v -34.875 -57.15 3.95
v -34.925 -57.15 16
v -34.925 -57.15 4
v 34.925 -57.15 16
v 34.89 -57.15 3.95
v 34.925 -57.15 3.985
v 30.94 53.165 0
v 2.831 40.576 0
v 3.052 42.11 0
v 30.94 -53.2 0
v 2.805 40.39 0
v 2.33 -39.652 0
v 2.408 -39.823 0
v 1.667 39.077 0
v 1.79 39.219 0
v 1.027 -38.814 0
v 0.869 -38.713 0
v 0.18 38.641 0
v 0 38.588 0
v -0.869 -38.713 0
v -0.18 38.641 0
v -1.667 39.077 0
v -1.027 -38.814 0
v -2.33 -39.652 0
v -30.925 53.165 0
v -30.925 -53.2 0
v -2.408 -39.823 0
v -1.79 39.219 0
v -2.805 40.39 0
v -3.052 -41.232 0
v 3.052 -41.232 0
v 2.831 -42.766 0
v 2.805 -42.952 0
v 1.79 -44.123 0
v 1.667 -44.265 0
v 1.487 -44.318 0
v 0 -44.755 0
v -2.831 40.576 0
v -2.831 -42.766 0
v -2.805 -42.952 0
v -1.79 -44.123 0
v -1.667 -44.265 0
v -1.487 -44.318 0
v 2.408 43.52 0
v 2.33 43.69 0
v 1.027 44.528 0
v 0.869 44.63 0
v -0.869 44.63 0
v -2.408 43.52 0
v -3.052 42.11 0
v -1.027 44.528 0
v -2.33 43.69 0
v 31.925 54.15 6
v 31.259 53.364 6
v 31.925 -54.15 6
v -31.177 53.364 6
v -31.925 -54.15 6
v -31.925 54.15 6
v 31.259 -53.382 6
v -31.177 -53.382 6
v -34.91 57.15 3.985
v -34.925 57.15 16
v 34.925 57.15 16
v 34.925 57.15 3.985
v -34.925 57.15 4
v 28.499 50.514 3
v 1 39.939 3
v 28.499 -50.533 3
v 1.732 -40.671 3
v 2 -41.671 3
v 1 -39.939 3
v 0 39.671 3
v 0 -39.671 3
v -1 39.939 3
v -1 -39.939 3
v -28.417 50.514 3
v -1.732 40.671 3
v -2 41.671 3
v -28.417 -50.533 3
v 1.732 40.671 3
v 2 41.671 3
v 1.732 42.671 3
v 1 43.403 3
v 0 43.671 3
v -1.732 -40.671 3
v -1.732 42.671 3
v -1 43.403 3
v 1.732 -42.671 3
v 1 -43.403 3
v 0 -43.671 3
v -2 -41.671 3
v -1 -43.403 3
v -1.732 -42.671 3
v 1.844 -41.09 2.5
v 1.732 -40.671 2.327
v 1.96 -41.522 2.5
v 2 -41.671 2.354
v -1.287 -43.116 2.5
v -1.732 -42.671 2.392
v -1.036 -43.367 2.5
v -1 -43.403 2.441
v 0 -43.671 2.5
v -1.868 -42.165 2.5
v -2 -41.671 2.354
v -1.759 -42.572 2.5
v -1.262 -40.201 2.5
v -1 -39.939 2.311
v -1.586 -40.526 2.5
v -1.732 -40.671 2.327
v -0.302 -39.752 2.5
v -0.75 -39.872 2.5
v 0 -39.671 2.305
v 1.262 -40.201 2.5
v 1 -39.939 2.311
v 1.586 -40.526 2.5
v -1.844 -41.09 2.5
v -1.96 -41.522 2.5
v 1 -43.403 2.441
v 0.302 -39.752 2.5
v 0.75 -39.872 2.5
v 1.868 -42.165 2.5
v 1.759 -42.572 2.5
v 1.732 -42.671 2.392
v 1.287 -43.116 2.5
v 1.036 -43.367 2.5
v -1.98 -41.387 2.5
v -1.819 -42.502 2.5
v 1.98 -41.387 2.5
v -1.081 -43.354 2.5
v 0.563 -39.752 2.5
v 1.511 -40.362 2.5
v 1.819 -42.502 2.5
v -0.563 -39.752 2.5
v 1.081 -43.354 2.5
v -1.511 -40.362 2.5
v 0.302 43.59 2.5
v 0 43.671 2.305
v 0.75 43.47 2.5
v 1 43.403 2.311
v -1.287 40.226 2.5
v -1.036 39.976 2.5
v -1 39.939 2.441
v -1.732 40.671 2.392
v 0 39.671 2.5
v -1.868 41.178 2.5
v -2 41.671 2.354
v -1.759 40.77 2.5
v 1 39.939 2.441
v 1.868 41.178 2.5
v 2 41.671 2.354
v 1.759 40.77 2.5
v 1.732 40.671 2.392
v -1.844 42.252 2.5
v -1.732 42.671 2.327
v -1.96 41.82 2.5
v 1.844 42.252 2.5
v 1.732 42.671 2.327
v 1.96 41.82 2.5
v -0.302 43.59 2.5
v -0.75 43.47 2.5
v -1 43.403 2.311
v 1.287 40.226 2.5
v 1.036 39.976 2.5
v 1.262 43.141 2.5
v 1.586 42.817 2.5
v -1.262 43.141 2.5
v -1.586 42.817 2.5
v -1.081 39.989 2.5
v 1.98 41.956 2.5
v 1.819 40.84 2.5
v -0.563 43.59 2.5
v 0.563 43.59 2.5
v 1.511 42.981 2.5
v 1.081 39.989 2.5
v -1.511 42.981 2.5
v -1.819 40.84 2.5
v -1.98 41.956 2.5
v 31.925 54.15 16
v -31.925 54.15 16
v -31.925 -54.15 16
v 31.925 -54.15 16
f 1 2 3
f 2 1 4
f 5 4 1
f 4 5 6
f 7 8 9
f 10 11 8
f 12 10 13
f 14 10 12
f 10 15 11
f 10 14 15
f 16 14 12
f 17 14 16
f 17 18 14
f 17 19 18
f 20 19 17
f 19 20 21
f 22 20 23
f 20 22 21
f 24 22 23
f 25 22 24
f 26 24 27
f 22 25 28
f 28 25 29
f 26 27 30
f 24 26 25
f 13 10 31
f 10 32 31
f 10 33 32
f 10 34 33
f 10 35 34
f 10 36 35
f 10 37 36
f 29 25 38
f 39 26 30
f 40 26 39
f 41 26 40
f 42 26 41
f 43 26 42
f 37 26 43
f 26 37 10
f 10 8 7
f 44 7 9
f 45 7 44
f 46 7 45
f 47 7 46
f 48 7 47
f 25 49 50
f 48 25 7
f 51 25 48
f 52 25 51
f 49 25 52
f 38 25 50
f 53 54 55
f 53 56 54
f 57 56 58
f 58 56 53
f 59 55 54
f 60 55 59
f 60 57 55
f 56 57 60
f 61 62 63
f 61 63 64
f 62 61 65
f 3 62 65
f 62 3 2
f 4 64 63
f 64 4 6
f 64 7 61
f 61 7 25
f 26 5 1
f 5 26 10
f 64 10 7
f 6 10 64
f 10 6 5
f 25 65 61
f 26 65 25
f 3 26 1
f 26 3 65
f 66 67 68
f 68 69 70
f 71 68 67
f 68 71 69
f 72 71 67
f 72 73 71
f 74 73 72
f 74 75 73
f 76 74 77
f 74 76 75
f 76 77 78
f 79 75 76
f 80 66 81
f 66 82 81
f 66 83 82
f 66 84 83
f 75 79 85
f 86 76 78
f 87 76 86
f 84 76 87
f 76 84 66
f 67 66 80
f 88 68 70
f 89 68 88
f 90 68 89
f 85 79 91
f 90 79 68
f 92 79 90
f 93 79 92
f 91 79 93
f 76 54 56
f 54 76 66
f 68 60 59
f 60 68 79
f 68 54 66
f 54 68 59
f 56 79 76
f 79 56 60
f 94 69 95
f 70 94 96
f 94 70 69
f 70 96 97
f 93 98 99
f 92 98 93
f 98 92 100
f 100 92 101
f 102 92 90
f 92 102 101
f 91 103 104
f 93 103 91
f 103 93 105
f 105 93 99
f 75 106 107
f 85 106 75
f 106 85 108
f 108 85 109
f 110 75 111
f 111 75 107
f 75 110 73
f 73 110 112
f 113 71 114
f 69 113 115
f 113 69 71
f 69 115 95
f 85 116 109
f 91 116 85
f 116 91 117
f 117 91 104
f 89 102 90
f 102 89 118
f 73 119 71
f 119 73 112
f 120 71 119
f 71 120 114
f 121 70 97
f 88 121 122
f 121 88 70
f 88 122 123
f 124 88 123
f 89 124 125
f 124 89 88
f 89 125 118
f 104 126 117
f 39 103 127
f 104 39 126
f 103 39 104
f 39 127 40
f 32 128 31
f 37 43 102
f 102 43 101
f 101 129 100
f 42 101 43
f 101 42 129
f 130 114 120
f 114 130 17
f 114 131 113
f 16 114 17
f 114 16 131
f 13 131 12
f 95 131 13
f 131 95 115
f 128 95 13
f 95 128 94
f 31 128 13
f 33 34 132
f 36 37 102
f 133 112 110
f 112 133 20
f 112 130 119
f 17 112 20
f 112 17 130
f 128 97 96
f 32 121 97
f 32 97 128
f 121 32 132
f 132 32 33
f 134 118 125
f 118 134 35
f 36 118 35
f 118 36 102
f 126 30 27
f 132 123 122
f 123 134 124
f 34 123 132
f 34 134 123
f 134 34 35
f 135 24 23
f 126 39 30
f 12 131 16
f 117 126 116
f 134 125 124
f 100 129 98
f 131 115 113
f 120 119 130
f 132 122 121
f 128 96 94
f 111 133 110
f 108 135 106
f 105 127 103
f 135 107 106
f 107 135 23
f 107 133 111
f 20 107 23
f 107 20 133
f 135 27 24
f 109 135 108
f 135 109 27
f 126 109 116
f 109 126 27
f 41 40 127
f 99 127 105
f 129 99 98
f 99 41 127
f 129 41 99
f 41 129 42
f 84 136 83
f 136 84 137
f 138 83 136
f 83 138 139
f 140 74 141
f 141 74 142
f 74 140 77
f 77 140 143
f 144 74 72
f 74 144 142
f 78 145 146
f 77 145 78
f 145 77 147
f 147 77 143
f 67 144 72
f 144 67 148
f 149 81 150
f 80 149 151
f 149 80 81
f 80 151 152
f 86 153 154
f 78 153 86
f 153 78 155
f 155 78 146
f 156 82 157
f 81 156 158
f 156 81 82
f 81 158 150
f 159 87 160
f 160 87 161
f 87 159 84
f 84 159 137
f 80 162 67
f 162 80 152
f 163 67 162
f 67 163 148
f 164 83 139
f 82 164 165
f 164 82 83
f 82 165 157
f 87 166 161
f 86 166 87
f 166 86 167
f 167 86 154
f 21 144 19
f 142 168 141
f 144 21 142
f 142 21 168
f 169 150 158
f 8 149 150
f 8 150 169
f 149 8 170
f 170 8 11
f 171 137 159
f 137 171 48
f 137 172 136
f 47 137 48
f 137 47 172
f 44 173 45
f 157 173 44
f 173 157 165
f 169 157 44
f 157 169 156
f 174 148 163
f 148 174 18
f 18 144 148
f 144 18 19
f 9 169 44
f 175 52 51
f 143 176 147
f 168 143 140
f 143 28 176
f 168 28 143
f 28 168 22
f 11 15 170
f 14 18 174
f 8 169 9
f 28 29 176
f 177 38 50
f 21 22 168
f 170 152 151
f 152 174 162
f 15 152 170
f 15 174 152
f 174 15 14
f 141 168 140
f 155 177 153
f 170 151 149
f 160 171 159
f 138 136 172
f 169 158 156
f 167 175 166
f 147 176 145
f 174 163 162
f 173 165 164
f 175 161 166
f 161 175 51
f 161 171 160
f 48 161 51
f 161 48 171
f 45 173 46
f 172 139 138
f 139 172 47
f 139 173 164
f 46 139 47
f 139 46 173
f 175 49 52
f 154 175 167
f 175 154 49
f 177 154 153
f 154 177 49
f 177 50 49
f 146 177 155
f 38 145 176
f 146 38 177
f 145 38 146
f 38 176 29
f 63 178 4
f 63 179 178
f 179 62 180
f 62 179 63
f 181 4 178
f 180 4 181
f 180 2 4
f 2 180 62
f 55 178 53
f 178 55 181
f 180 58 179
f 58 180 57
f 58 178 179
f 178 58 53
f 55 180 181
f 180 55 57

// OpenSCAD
// WALLY - Wall Plate Customizer v1.3
// by TheNewHobbyist 2013 (http://thenewhobbyist.com)
// http://www.thingiverse.com/thing:47956
//
// Most of the connectors used with this thing are panel mount connectors from
// www.DataPro.net I can't vouch for their quality but they did have easy to
// find dimensions for their products so I used them.
//
// This could be tightened up considerably but I thought I'd get it out there for people
// to experiment with before I lose my mind staring at it too long. Also this is my
// first OpenSCAD model so cut me some slack ;)
//
//   Notes:
//
// * The plug types "Duplex Outlet", "Long_Toggle Switch", "Toggle Switch", and "Rocker"
//   will all use the entire plate when selected in top or bottom configuration. The
//   other selection (if not "none" will be selected.
//
// * "None" and "Blank should not be considered equal. if "None" is selected for one of
//   the two holes on a plate the other selection will be centered on that plate. If
//   "Blank" is selected that plug location will remain blank but the other selection
//   will NOT move into a centered position.
//
//	Change Log:
//
//	v1.1
//	UPDATED: Screw hole locations for designer and toggle plate types.
//	UPDATED: Hole size for designer plate type.
//	UPDATED: Outlet hole spacing
//
//	v1.2
//	ADDED: Long Toggle Switch for laird
//
//	v1.3
//	ADDED: 3 new sizes for plate export: Standard, Junior-Jumbo, and Jumbo.
//

  //////////////////////////
 // Customizer Settings: //
//////////////////////////

//How big are we talkin' here?
plate_width = 1; //	[1:5]

// Bigger hole in your wall? Try this
plate_size = 0; // [0:Standard, 1:Junior-Jumbo, 2:Jumbo]

//Pick a plug or full plate type
1st_plate = "none";  //	["none":None, "blank":Blank Port, "toggle":Full Plate - Toggle Switch, "long_toggle":Full Plate - Long Toggle Switch, "outlet":Full Plate - Duplex Outlet, "rocker":Full Plate - Rocker/Designer Plate, "keystone1":Keystone Jack, "vga":VGA Port, "hdmi":HDMI Port, "dvi":DVI-I Port, "displayport":Displayport, "cat5e":Cat5e/Cat6 Port, "usb-a":USB-A Port, "usb-b":USB-B Port, "firewire":Firewire IEEE 1394 Port, "db09":DB-09 Port, "ps2":PS2 Port, "f-type": F-Type/Coaxial Port,"svideo":S-Video Port, "stereo":Stereo Headphone Jack]
//Pick a bottom plug type or leave as none
1st_plate_bottom_hole = "none";  //	["none":None, "blank":Blank Port, "keystone1":Keystone Jack, "vga":VGA Port, "hdmi":HDMI Port, "dvi":DVI-I Port, "displayport":Displayport, "cat5e":Cat5e/Cat6 Port, "usb-a":USB-A Port, "usb-b":USB-B Port, "firewire":Firewire IEEE 1394 Port, "db09":DB-09 Port, "ps2":PS2 Port, "f-type": F-Type/Coaxial Port,"svideo":S-Video Port, "stereo":Stereo Headphone Jack]
//Pick a plug or full plate type
2nd_plate = "none";  //	["none":None, "blank":Blank Port, "toggle":Full Plate - Toggle Switch, "long_toggle":Full Plate - Long Toggle Switch, "outlet":Full Plate - Duplex Outlet, "rocker":Full Plate - Rocker/Designer Plate, "keystone1":Keystone Jack, "vga":VGA Port, "hdmi":HDMI Port, "dvi":DVI-I Port, "displayport":Displayport, "cat5e":Cat5e/Cat6 Port, "usb-a":USB-A Port, "usb-b":USB-B Port, "firewire":Firewire IEEE 1394 Port, "db09":DB-09 Port, "ps2":PS2 Port, "f-type": F-Type/Coaxial Port,"svideo":S-Video Port, "stereo":Stereo Headphone Jack]
//Pick a bottom plug type or leave as none
2nd_plate_bottom_hole = "none";  //	["none":None, "blank":Blank Port, "keystone1":Keystone Jack, "vga":VGA Port, "hdmi":HDMI Port, "dvi":DVI-I Port, "displayport":Displayport, "cat5e":Cat5e/Cat6 Port, "usb-a":USB-A Port, "usb-b":USB-B Port, "firewire":Firewire IEEE 1394 Port, "db09":DB-09 Port, "ps2":PS2 Port, "f-type": F-Type/Coaxial Port,"svideo":S-Video Port, "stereo":Stereo Headphone Jack]
//Pick a plug or full plate type
3rd_plate = "none";  //	["none":None, "blank":Blank Port, "toggle":Full Plate - Toggle Switch, "long_toggle":Full Plate - Long Toggle Switch, "outlet":Full Plate - Duplex Outlet, "rocker":Full Plate - Rocker/Designer Plate, "keystone1":Keystone Jack, "vga":VGA Port, "hdmi":HDMI Port, "dvi":DVI-I Port, "displayport":Displayport, "cat5e":Cat5e/Cat6 Port, "usb-a":USB-A Port, "usb-b":USB-B Port, "firewire":Firewire IEEE 1394 Port, "db09":DB-09 Port, "ps2":PS2 Port, "f-type": F-Type/Coaxial Port,"svideo":S-Video Port, "stereo":Stereo Headphone Jack]
//Pick a bottom plug type or leave as none
3rd_plate_bottom_hole = "none";  //	["none":None, "blank":Blank Port, "keystone1":Keystone Jack, "vga":VGA Port, "hdmi":HDMI Port, "dvi":DVI-I Port, "displayport":Displayport, "cat5e":Cat5e/Cat6 Port, "usb-a":USB-A Port, "usb-b":USB-B Port, "firewire":Firewire IEEE 1394 Port, "db09":DB-09 Port, "ps2":PS2 Port, "f-type": F-Type/Coaxial Port,"svideo":S-Video Port, "stereo":Stereo Headphone Jack]
//Pick a plug or full plate type
4th_plate = "none";  //["none":None, "blank":Blank Port, "toggle":Full Plate - Toggle Switch, "long_toggle":Full Plate - Long Toggle Switch, "outlet":Full Plate - Duplex Outlet, "rocker":Full Plate - Rocker/Designer Plate, "keystone1":Keystone Jack, "vga":VGA Port, "hdmi":HDMI Port, "dvi":DVI-I Port, "displayport":Displayport, "cat5e":Cat5e/Cat6 Port, "usb-a":USB-A Port, "usb-b":USB-B Port, "firewire":Firewire IEEE 1394 Port, "db09":DB-09 Port, "ps2":PS2 Port, "f-type": F-Type/Coaxial Port,"svideo":S-Video Port, "stereo":Stereo Headphone Jack]
//Pick a bottom plug type or leave as none
4th_plate_bottom_hole = "none";  //	["none":None, "blank":Blank Port, "keystone1":Keystone Jack, "vga":VGA Port, "hdmi":HDMI Port, "dvi":DVI-I Port, "displayport":Displayport, "cat5e":Cat5e/Cat6 Port, "usb-a":USB-A Port, "usb-b":USB-B Port, "firewire":Firewire IEEE 1394 Port, "db09":DB-09 Port, "ps2":PS2 Port, "f-type": F-Type/Coaxial Port,"svideo":S-Video Port, "stereo":Stereo Headphone Jack]
//Pick a plug or full plate type
5th_plate = "none";  //["none":None, "blank":Blank Port, "toggle":Full Plate - Toggle Switch, "long_toggle":Full Plate - Long Toggle Switch, "outlet":Full Plate - Duplex Outlet, "rocker":Full Plate - Rocker/Designer Plate, "keystone1":Keystone Jack, "vga":VGA Port, "hdmi":HDMI Port, "dvi":DVI-I Port, "displayport":Displayport, "cat5e":Cat5e/Cat6 Port, "usb-a":USB-A Port, "usb-b":USB-B Port, "firewire":Firewire IEEE 1394 Port, "db09":DB-09 Port, "ps2":PS2 Port, "f-type": F-Type/Coaxial Port,"svideo":S-Video Port, "stereo":Stereo Headphone Jack]
//Pick a bottom plug type or leave as none
5th_plate_bottom_hole = "none";  //	["none":None, "blank":Blank Port, "keystone1":Keystone Jack, "vga":VGA Port, "hdmi":HDMI Port, "dvi":DVI-I Port, "displayport":Displayport, "cat5e":Cat5e/Cat6 Port, "usb-a":USB-A Port, "usb-b":USB-B Port, "firewire":Firewire IEEE 1394 Port, "db09":DB-09 Port, "ps2":PS2 Port, "f-type": F-Type/Coaxial Port,"svideo":S-Video Port, "stereo":Stereo Headphone Jack]

//Extra Amount that plate extends from wall (useful for shallow boxes)
plate_sticks_out = 10; // [0-40]
//Wall thickness for plate extension
sticks_out_thick = 3; // [2-4]

  //////////////////////
 // Static Settings: //
//////////////////////

module GoAwayCustomizer() {
// This module is here to stop Customizer from picking up the variables below
}

l_offset = [34.925,39.6875,44.45];
r_offset = [34.925,39.6875,44.45];
spacer = [0,0,46.0375,92.075,138.1125,184.15];
solid_plate_width = l_offset[plate_size] + spacer[plate_width] + r_offset[plate_size];

height_sizes = [114.3,123.825,133.35];

height = 114.3; //plate height (static)
gang_width=[0,69.86,115.824,161.925,206.375,254]; // Plate widths (standard)

edgewidth = solid_plate_width + 10; // Bevel setting for top and bottom
rightbevel = solid_plate_width - 4; // Bevel for right side (scales)

left_offset = 34.925; // Offset first hole position
switch_offset = 46.0375; // Offset all additional holes
thinner_offset=[0,0.92,0.95,0.96,0.97,0.973]; // Manual fix for right side wackiness

positions=[height_sizes[plate_size]/2,height_sizes[plate_size]/2 - 14.25,height_sizes[plate_size]/2 + 14.25];

// preview[view:north, tilt:bottom]


  ///////////////////
 // Hole Control: //
///////////////////

module plate1(){
	if (1st_plate == "toggle" || 1st_plate_bottom_hole == "toggle"){
		translate([0,l_offset[plate_size],0]) toggle_screws();
		translate([0,l_offset[plate_size],0]) hole("toggle");
		}
	else if (1st_plate == "long_toggle" || 1st_plate_bottom_hole == "long_toggle"){
		translate([0,l_offset[plate_size],0]) toggle_screws();
		translate([0,l_offset[plate_size],0]) hole("long_toggle");
		}
	else if (1st_plate == "rocker" || 1st_plate_bottom_hole == "rocker"){
		translate([0,l_offset[plate_size],0]) rocker_screws();
		translate([0,l_offset[plate_size],0]) hole("rocker");
		}
	else if (1st_plate == "outlet" || 1st_plate_bottom_hole == "outlet") {
	translate([0,l_offset[plate_size],0]) hole("outlet");
	}
	else if (1st_plate_bottom_hole == "none") {
		translate([0,l_offset[plate_size],0]) box_screws();
		translate([positions[0],l_offset[plate_size],0]) hole(1st_plate);
			}
	else if (1st_plate == "none") {
		translate([0,l_offset[plate_size],0]) box_screws();
		translate([positions[0],l_offset[plate_size],0]) hole(1st_plate_bottom_hole);
			}
	else {
	translate([0,l_offset[plate_size],0]) box_screws();
	translate([positions[1],l_offset[plate_size],0]) hole(1st_plate);
	translate([positions[2],l_offset[plate_size],0]) hole(1st_plate_bottom_hole);
	}
}

module plate2(){
	if (2nd_plate == "toggle" || 2nd_plate_bottom_hole == "toggle"){
		translate([0,l_offset[plate_size] + switch_offset,0]) toggle_screws();
		translate([0,l_offset[plate_size] + switch_offset,0]) hole("toggle");
		}
	else if (2nd_plate == "long_toggle" || 2nd_plate_bottom_hole == "long_toggle"){
		translate([0,l_offset[plate_size] + switch_offset,0]) toggle_screws();
		translate([0,l_offset[plate_size] + switch_offset,0]) hole("long_toggle");
		}
	else if (2nd_plate == "rocker" || 2nd_plate_bottom_hole == "rocker"){
		translate([0,l_offset[plate_size] + switch_offset,0]) rocker_screws();
		translate([0,l_offset[plate_size] + switch_offset,0]) hole("rocker");
		}
	else if (2nd_plate == "outlet" || 2nd_plate_bottom_hole == "outlet") {
	translate([0,l_offset[plate_size] + switch_offset,0]) hole("outlet");
	}
	else if (2nd_plate_bottom_hole == "none") {
		translate([0,l_offset[plate_size] + switch_offset,0]) box_screws();
		translate([positions[0],l_offset[plate_size] + switch_offset,0]) hole(2nd_plate);
			}
	else if (2nd_plate == "none") {
		translate([0,l_offset[plate_size] + switch_offset,0]) box_screws();
		translate([positions[0],l_offset[plate_size] + switch_offset,0]) hole(2nd_plate_bottom_hole);
			}
	else {
	translate([0,l_offset[plate_size] + switch_offset,0]) box_screws();
	translate([positions[1],l_offset[plate_size] + switch_offset,0]) hole(2nd_plate);
	translate([positions[2],l_offset[plate_size] + switch_offset,0]) hole(2nd_plate_bottom_hole);
	}
}

module plate3(){
	if (3rd_plate == "toggle" || 3rd_plate_bottom_hole == "toggle"){
		translate([0,l_offset[plate_size] + switch_offset * 2,0]) toggle_screws();
		translate([0,l_offset[plate_size] + switch_offset * 2,0]) hole("toggle");
		}
	else if (3rd_plate == "long_toggle" || 3rd_plate_bottom_hole == "long_toggle"){
		translate([0,l_offset[plate_size] + switch_offset * 2,0]) toggle_screws();
		translate([0,l_offset[plate_size] + switch_offset * 2,0]) hole("long_toggle");
		}
	else if (3rd_plate == "rocker" || 3rd_plate_bottom_hole == "rocker"){
		translate([0,l_offset[plate_size] + switch_offset * 2,0]) rocker_screws();
		translate([0,l_offset[plate_size] + switch_offset * 2,0]) hole("rocker");
		}
	else if (3rd_plate == "outlet" || 3rd_plate_bottom_hole == "outlet") {
	translate([0,l_offset[plate_size] + switch_offset * 2,0]) hole("outlet");
	}
	else if (3rd_plate_bottom_hole == "none") {
		translate([0,l_offset[plate_size] + switch_offset * 2,0]) box_screws();
		translate([positions[0],l_offset[plate_size] + switch_offset * 2,0]) hole(3rd_plate);
			}
	else if (3rd_plate == "none") {
		translate([0,l_offset[plate_size] + switch_offset * 2,0]) box_screws();
		translate([positions[0],l_offset[plate_size] + switch_offset * 2,0]) hole(3rd_plate_bottom_hole);
			}
	else {
	translate([0,l_offset[plate_size] + switch_offset * 2,0]) box_screws();
	translate([positions[1],l_offset[plate_size] + switch_offset * 2,0]) hole(3rd_plate);
	translate([positions[2],l_offset[plate_size] + switch_offset * 2,0]) hole(3rd_plate_bottom_hole);
	}
}

module plate4(){
	if (4th_plate == "toggle" || 4th_plate_bottom_hole == "toggle"){
		translate([0,l_offset[plate_size] + switch_offset * 3,0]) toggle_screws();
		translate([0,l_offset[plate_size] + switch_offset * 3,0]) hole("toggle");
		}
	else if (4th_plate == "long_toggle" || 4th_plate_bottom_hole == "long_toggle"){
		translate([0,l_offset[plate_size] + switch_offset * 3,0]) toggle_screws();
		translate([0,l_offset[plate_size] + switch_offset * 3,0]) hole("long_toggle");
		}
	else if (4th_plate == "rocker" || 4th_plate_bottom_hole == "rocker"){
		translate([0,l_offset[plate_size] + switch_offset * 3,0]) rocker_screws();
		translate([0,l_offset[plate_size] + switch_offset * 3,0]) hole("rocker");
		}
	else if (4th_plate == "outlet" || 4th_plate_bottom_hole == "outlet") {
	translate([0,l_offset[plate_size] + switch_offset * 3,0]) hole("outlet");
	}
	else if (4th_plate_bottom_hole == "none") {
		translate([0,l_offset[plate_size] + switch_offset * 3,0]) box_screws();
		translate([positions[0],l_offset[plate_size] + switch_offset * 3,0]) hole(4th_plate);
			}
	else if (4th_plate == "none") {
		translate([0,l_offset[plate_size] + switch_offset * 3,0]) box_screws();
		translate([positions[0],l_offset[plate_size] + switch_offset * 3,0]) hole(4th_plate_bottom_hole);
			}
	else {
	translate([0,l_offset[plate_size] + switch_offset * 3,0]) box_screws();
	translate([positions[1],l_offset[plate_size] + switch_offset * 3,0]) hole(4th_plate);
	translate([positions[2],l_offset[plate_size] + switch_offset * 3,0]) hole(4th_plate_bottom_hole);
	}
}

module plate5(){
	if (5th_plate == "toggle" || 5th_plate_bottom_hole == "toggle"){
		translate([0,l_offset[plate_size] + switch_offset * 4,0]) toggle_screws();
		translate([0,l_offset[plate_size] + switch_offset * 4,0]) hole("toggle");
		}
	else if (5th_plate == "long_toggle" || 5th_plate_bottom_hole == "long_toggle"){
		translate([0,l_offset[plate_size] + switch_offset * 4,0]) toggle_screws();
		translate([0,l_offset[plate_size] + switch_offset * 4,0]) hole("long_toggle");
		}
	else if (5th_plate == "rocker" || 5th_plate_bottom_hole == "rocker"){
		translate([0,l_offset[plate_size] + switch_offset * 4,0]) rocker_screws();
		translate([0,l_offset[plate_size] + switch_offset * 4,0]) hole("rocker");
		}
	else if (5th_plate == "outlet" || 5th_plate_bottom_hole == "outlet") {
	translate([0,l_offset[plate_size] + switch_offset * 4,0]) hole("outlet");
	}
	else if (5th_plate_bottom_hole == "none") {
		translate([0,l_offset[plate_size] + switch_offset * 4,0]) box_screws();
		translate([positions[0],l_offset[plate_size] + switch_offset * 4,0]) hole(5th_plate);
			}
	else if (5th_plate == "none") {
		translate([0,l_offset[plate_size] + switch_offset * 4,0]) box_screws();
		translate([positions[0],l_offset[plate_size] + switch_offset * 4,0]) hole(5th_plate_bottom_hole);
			}
	else {
	translate([0,l_offset[plate_size] + switch_offset * 4,0]) box_screws();
	translate([positions[1],l_offset[plate_size] + switch_offset * 4,0]) hole(5th_plate);
	translate([positions[2],l_offset[plate_size] + switch_offset * 4,0]) hole(5th_plate_bottom_hole);
	}
}

  /////////////////
 // SolidWorks: //
/////////////////

module extend_box() { union () {
	translate([0,0,-plate_sticks_out]) cube([height_sizes[plate_size],sticks_out_thick,plate_sticks_out]);
	translate([0,solid_plate_width-sticks_out_thick,-plate_sticks_out]) cube([height_sizes[plate_size],sticks_out_thick,plate_sticks_out]);
	translate([0,0,-plate_sticks_out]) cube([sticks_out_thick,solid_plate_width,plate_sticks_out]);
	translate([height_sizes[plate_size]-sticks_out_thick,0,-plate_sticks_out]) cube([sticks_out_thick,solid_plate_width,plate_sticks_out]);
    }
}
	    
	    module plate1_solid(){
if (1st_plate == "keystone1" && 1st_plate_bottom_hole == "none") {
	translate([height_sizes[plate_size]/2 + 14.3,l_offset[plate_size] - 11.5,-3.9]) hole("keystone_solid");
	}
else if (1st_plate == "keystone1" && 1st_plate_bottom_hole != "outlet" && 1st_plate_bottom_hole != "toggle" && 1st_plate_bottom_hole != "rocker") {
	translate([height_sizes[plate_size]/2,l_offset[plate_size] - 11.5,-3.9]) hole("keystone_solid");
	}
if (1st_plate_bottom_hole == "keystone1" && 1st_plate == "none") {
	translate([height_sizes[plate_size]/2 + 14.3,l_offset[plate_size] - 11.5,-3.9]) hole("keystone_solid");
	}
else if (1st_plate_bottom_hole == "keystone1" && 1st_plate != "outlet" && 1st_plate != "toggle" && 1st_plate != "rocker") {
	translate([height_sizes[plate_size]/2 + 28.5,l_offset[plate_size] - 11.5,-3.9]) hole("keystone_solid");
	}

}

module plate2_solid(){
if (2nd_plate == "keystone1" && 2nd_plate_bottom_hole == "none") {
	translate([height_sizes[plate_size]/2 + 14.3,l_offset[plate_size] - 11.5 + switch_offset,-3.9]) hole("keystone_solid");
	}
else if (2nd_plate == "keystone1" && 2nd_plate_bottom_hole != "outlet" && 2nd_plate_bottom_hole != "toggle" && 2nd_plate_bottom_hole != "rocker") {
	translate([height_sizes[plate_size]/2,l_offset[plate_size] - 11.5 + switch_offset,-3.9]) hole("keystone_solid");
	}
if (2nd_plate_bottom_hole == "keystone1" && 2nd_plate == "none") {
	translate([height_sizes[plate_size]/2 + 14.3,l_offset[plate_size] - 11.5 + switch_offset,-3.9]) hole("keystone_solid");
	}
else if (2nd_plate_bottom_hole == "keystone1" && 2nd_plate != "outlet" && 2nd_plate != "toggle" && 2nd_plate != "rocker") {
	translate([height_sizes[plate_size]/2 + 28.5,l_offset[plate_size] - 11.5 + switch_offset,-3.9]) hole("keystone_solid");
	}

}

module plate3_solid(){
if (3rd_plate == "keystone1" && 3rd_plate_bottom_hole == "none") {
	translate([height_sizes[plate_size]/2 + 14.3,l_offset[plate_size] - 11.5 + switch_offset * 2,-3.9]) hole("keystone_solid");
	}
else if (3rd_plate == "keystone1" && 3rd_plate_bottom_hole != "outlet" && 3rd_plate_bottom_hole != "toggle" && 3rd_plate_bottom_hole != "rocker") {
	translate([height_sizes[plate_size]/2,l_offset[plate_size] - 11.5 + switch_offset * 2,-3.9]) hole("keystone_solid");
	}
if (3rd_plate_bottom_hole == "keystone1" && 3rd_plate == "none") {
	translate([height_sizes[plate_size]/2 + 14.3,l_offset[plate_size] - 11.5 + switch_offset * 2,-3.9]) hole("keystone_solid");
	}
else if (3rd_plate_bottom_hole == "keystone1" && 3rd_plate != "outlet" && 3rd_plate != "toggle" && 3rd_plate != "rocker") {
	translate([height_sizes[plate_size]/2 + 28.5,l_offset[plate_size] - 11.5 + switch_offset * 2,-3.9]) hole("keystone_solid");
	}

}

module plate4_solid(){
if (4th_plate == "keystone1" && 4th_plate_bottom_hole == "none") {
	translate([height_sizes[plate_size]/2 + 14.3,l_offset[plate_size] - 11.5 + switch_offset * 3,-3.9]) hole("keystone_solid");
	}
else if (4th_plate == "keystone1" && 4th_plate_bottom_hole != "outlet" && 4th_plate_bottom_hole != "toggle" && 4th_plate_bottom_hole != "rocker") {
	translate([height_sizes[plate_size]/2,l_offset[plate_size] - 11.5 + switch_offset * 3,-3.9]) hole("keystone_solid");
	}
if (4th_plate_bottom_hole == "keystone1" && 4th_plate == "none") {
	translate([height_sizes[plate_size]/2 + 14.3,l_offset[plate_size] - 11.5 + switch_offset * 3,-3.9]) hole("keystone_solid");
	}
else if (4th_plate_bottom_hole == "keystone1" && 4th_plate != "outlet" && 4th_plate != "toggle" && 4th_plate != "rocker") {
	translate([height_sizes[plate_size]/2 + 28.5,l_offset[plate_size] - 11.5 + switch_offset * 3,-3.9]) hole("keystone_solid");
	}

}

module plate5_solid(){
if (5th_plate == "keystone1" && 5th_plate_bottom_hole == "none") {
	translate([height_sizes[plate_size]/2 + 14.3,l_offset[plate_size] - 11.5 + switch_offset * 4,-3.9]) hole("keystone_solid");
	}
else if (5th_plate == "keystone1" && 5th_plate_bottom_hole != "outlet" && 5th_plate_bottom_hole != "toggle" && 5th_plate_bottom_hole != "rocker") {
	translate([height_sizes[plate_size]/2,l_offset[plate_size] - 11.5 + switch_offset * 4,-3.9]) hole("keystone_solid");
	}
if (5th_plate_bottom_hole == "keystone1" && 5th_plate == "none") {
	translate([height_sizes[plate_size]/2 + 14.3,l_offset[plate_size] - 11.5 + switch_offset * 4,-3.9]) hole("keystone_solid");
	}
else if (5th_plate_bottom_hole == "keystone1" && 5th_plate != "outlet" && 5th_plate != "toggle" && 5th_plate != "rocker") {
	translate([height_sizes[plate_size]/2 + 28.5,l_offset[plate_size] - 11.5 + switch_offset * 4,-3.9]) hole("keystone_solid");
	}

}

  ///////////////////
 // PlateStation: //
///////////////////

//Plate size and bevel
module plate() {
    union () {
	difference() {
		cube([height_sizes[plate_size],solid_plate_width,6]);
		translate([-4.3,-5,6.2]) rotate([0,45,0]) cube([6,edgewidth,6]); //Top Bevel
		translate([height_sizes[plate_size]-4.2,-5,6.25]) rotate([0,45,0]) cube([6,edgewidth,6]); //Bottom Bevel
		translate([height_sizes[plate_size]+10,-4.4,6.1]) rotate([0,45,90]) cube([6,height_sizes[plate_size]+20,6]); //Left Bevel (doesn't change)
		translate([height_sizes[plate_size]+10,rightbevel,6]) rotate([0,45,90]) cube([6,height_sizes[plate_size]+10,6]); //Right Bevel (scales right)
	    }
	}
    }


// Thinning Plate
module plate_inner() {
	scale([0.95,thinner_offset[plate_width],1]){
	translate([3,3,0]){
	difference() {
		cube([height_sizes[plate_size],solid_plate_width,6]);
		translate([-4.3,-5,6.2]) rotate([0,45,0]) cube([6,edgewidth,6]); //Top Bevel
		translate([height_sizes[plate_size]-4.2,-5,6.25]) rotate([0,45,0]) cube([6,edgewidth,6]); //Bottom Bevel
		translate([height_sizes[plate_size]+10,-4.4,6.1]) rotate([0,45,90]) cube([6,height_sizes[plate_size]+20,6]); //Left Bevel (doesn't change)
		translate([height_sizes[plate_size]+10,rightbevel,6]) rotate([0,45,90]) cube([6,height_sizes[plate_size]+10,6]); //Right Bevel (scales right)
				}
			}
		}
	}

// Box screw holes
module box_screws(){
	 translate([height_sizes[plate_size]/2 + 41.67125,0,-1]) cylinder(r=2, h=10, $fn=12);
	 translate([height_sizes[plate_size]/2 + 41.67125,0,3.5]) cylinder(r1=2, r2=3.3, h=3);
	 translate([height_sizes[plate_size]/2 - 41.67125,0,-1]) cylinder(r=2, h=10, $fn=12);
	 translate([height_sizes[plate_size]/2 - 41.67125,0,3.5]) cylinder(r1=2, r2=3.3, h=3);
}

// Rocker/Designer screw holes
module rocker_screws(){
	 translate([height_sizes[plate_size]/2 + 48.41875,0,-1]) cylinder(r=2, h=10, $fn=12);
	 translate([height_sizes[plate_size]/2 + 48.41875,0,3.5]) cylinder(r1=2, r2=3.3, h=3);
	 translate([height_sizes[plate_size]/2 - 48.41875,0,-1]) cylinder(r=2, h=10, $fn=12);
	 translate([height_sizes[plate_size]/2 - 48.41875,0,3.5]) cylinder(r1=2, r2=3.3, h=3);
}

// Toggle screw holes
module toggle_screws(){
	 translate([height_sizes[plate_size]/2 + 30.1625,0,-1]) cylinder(r=2, h=10, $fn=12);
	 translate([height_sizes[plate_size]/2 + 30.1625,0,3.5]) cylinder(r1=2, r2=3.3, h=3);
	 translate([height_sizes[plate_size]/2 - 30.1625,0,-1]) cylinder(r=2, h=10, $fn=12);
	 translate([height_sizes[plate_size]/2 - 30.1625,0,3.5]) cylinder(r1=2, r2=3.3, h=3);
}

  ///////////////
 // Portland: //
///////////////

// Hole Cutout definitions
module hole(hole_type) {


// Toggle switch hole
	if (hole_type == "toggle") {
		translate([height_sizes[plate_size]/2,0,0]) cube([23.8125,10.3188,15], center = true);
		 						}

// Toggle switch hole and screw holes
	if (hole_type == "long_toggle") {
		translate([height_sizes[plate_size]/2,0,0]) cube([43.6563,11.9063,15], center = true);
		 						}

// Rocker switch plate
	if (hole_type == "rocker") {
		translate([height_sizes[plate_size]/2,0,0]) cube([67.1,33.3,15], center = true);

		 						}

// Duplex power outlet plate or dual side toggles
	if (hole_type == "outlet" || hole_type == "dualsidetoggle") {
		translate([height_sizes[plate_size]/2 + 19.3915,0,0]) {
			difference() {
				cylinder(r=17.4625, h=15, center = true);
				translate([-24.2875,-15,-2]) cube([10,37,15], center = false);
				translate([14.2875,-15,-2]) cube([10,37,15], center = false);
								}
							}
		translate([height_sizes[plate_size]/2 - 19.3915,0,0]){
			difference(){
				cylinder(r=17.4625, h=15, center = true);
				translate([-24.2875,-15,-2]) cube([10,37,15], center = false);
				translate([14.2875,-15,-2]) cube([10,37,15], center = false);
								}
							}
		translate([height_sizes[plate_size]/2,0,-1]) cylinder(r=2, h=10);
		translate([height_sizes[plate_size]/2,0,3.5]) cylinder(r1=2, r2=3.3, h=3);
							}

// Blank plate
	if (hole_type == "blank") { }

// VGA & DB09 plate
// VGA Fits http://www.datapro.net/products/vga-dual-panel-mount-f-f-cable.html
// DB09 Fits http://www.datapro.net/products/db9-serial-panel-mount-male-extension.html
	if (hole_type == "vga" || hole_type == "db09") {

			translate([0,-12.5,3]) cylinder(r=1.75, h=10, center = true);
			translate([0,12.5,3]) cylinder(r=1.75, h=10, center = true);
				difference(){
					cube([10,19,13], center=true);
					translate([-5,-9.2,1]) rotate([0,0,-35.6]) cube([4.4,2.4,15], center=true);
					translate([.9,-11.2,0]) rotate([0,0,9.6]) cube([10,4.8,15], center=true);
					translate([4.6,-8.5,0]) rotate([0,0,37.2]) cube([4.4,2.4,15], center=true);
					translate([-5,9.2,1]) rotate([0,0,35.6]) cube([4.4,2.4,15], center=true);
					translate([0.9,11.2,0]) rotate([0,0,-9.6]) cube([10,4.8,15], center=true);
					translate([4.6,8.5,0]) rotate([0,0,-37.2]) cube([4.4,2.4,15], center=true);
								}
						}

// HDMI plate
// Fits http://www.datapro.net/products/hdmi-panel-mount-extension-cable.html
	if (hole_type == "hdmi") {
		translate([0,-13,3]) cylinder(r=1.75, h=10, center = true);
		translate([0,13,3]) cylinder(r=1.75, h=10, center = true);
		translate([0,0,3]) cube([6,16,10], center=true);
							}

// DVI-I plate
// Fits http://www.datapro.net/products/dvi-i-panel-mount-extension-cable.html
	if (hole_type == "dvi") {
		translate([0,-16,3]) cylinder(r=1.75, h=10, center = true);
		translate([0,16,3]) cylinder(r=1.75, h=10, center = true);
		translate([0,0,3]) cube([10,26,10], center=true);
							}

// DisplayPort plate
// Fits http://www.datapro.net/products/dvi-i-panel-mount-extension-cable.html
	if (hole_type == "displayport") {
		translate([0,-13.5,3]) cylinder(r=1.75, h=10, center = true);
		translate([0,13.5,3]) cylinder(r=1.75, h=10, center = true);
		translate([0,0,0]){
			difference(){
				translate([0,0,3]) cube([7,19,10], center=true);
				translate([2.47,-9.37,3]) rotate([0,0,-54.6]) cube([3,5,14], center=true);
						}
								}
									}

// USB-A Plate
// Fits http://www.datapro.net/products/usb-panel-mount-type-a-cable.html
	if (hole_type == "usb-a") {
		translate([0,-15,3]) cylinder(r=1.75, h=10, center = true);
		translate([0,15,3]) cylinder(r=1.75, h=10, center = true);
		translate([0,0,3]) cube([8,16,10], center=true);
							}

// USB-B Plate
// Fits http://www.datapro.net/products/usb-panel-mount-type-b-cable.html
	if (hole_type == "usb-b") {
		translate([0,-13,3]) cylinder(r=1.75, h=10, center = true);
		translate([0,13,3]) cylinder(r=1.75, h=10, center = true);
		translate([0,0,3]) cube([11,12,10], center=true);
							}

// 1394 Firewire Plate
// Fits http://www.datapro.net/products/firewire-panel-mount-extension.html
	if (hole_type == "firewire") {
		translate([0,-13.5,3]) cylinder(r=1.75, h=10, center = true);
		translate([0,13.5,3]) cylinder(r=1.75, h=10, center = true);
		translate([0,0,3]) cube([7,12,10], center=true);
							}

// F-Type / Cable TV Plate
// Fits http://www.datapro.net/products/f-type-panel-mounting-coupler.html
	if (hole_type == "f-type") {
		translate([0,0,3]) cylinder(r=4.7625, h=10, center=true);
							}

// Cat5e & Gat6 plate
// Cat5e Fits http://www.datapro.net/products/cat-5e-panel-mount-ethernet.html
// Cat6 Fits hhttp://www.datapro.net/products/cat-6-panel-mount-ethernet.html
	if (hole_type == "cat5e" || hole_type == "cat6") {
		translate([0,-12.5,3]) cylinder(r=1.75, h=10, center = true);
		translate([0,12.5,3]) cylinder(r=1.75, h=10, center = true);
		translate([0,0,3]) cube([15,15,10], center=true);
		}

// S-Video & PS2 plate
// S-Video Fits hhttp://www.datapro.net/products/cat-6-panel-mount-ethernet.html
// PS2 http://www.datapro.net/products/ps2-panel-mount-extension-cable.html
	if (hole_type == "svideo" || hole_type == "ps2") {
		translate([0,-10,3]) cylinder(r=1.75, h=10, center = true);
		translate([0,10,3]) cylinder(r=1.75, h=10, center = true);
		translate([0,0,3]) cylinder(r=5, h=10, center=true);
		}


// Stereo / 1/4" headphone jack coupler
// Stereo coupler Fits http://www.datapro.net/products/stereo-panel-mount-coupler.html
	if (hole_type == "stereo") {
		translate([0,0,3]) cylinder(r=2.985, h=10, center=true);
		}

//Keystone1 hole
//Hole for 1 Keystone Jack
	if (hole_type == "keystone1") {
		translate([0,0,5]) cube([16.5,15,10], center = true);
	}

//Keystone Solid
	if (hole_type == "keystone_solid") {
		rotate([0,0,90]) {
			difference(){
				translate([0,0,.1]) cube([23,30.5,9.8]);
					translate([4,4,0]){
						difference(){
							cube([15,22.5,10]);
							translate([-1,-0.001,3.501]) cube([17,2,6.5]);
							translate([-1,2.5,-3.40970]) rotate([45,0,0]) cube([17,2,6.5]);
							translate([-1,18.501,6.001]) cube([17,4,4]);
							translate([-1,20.5,0]) rotate([-45,0,0]) cube([17,2,6.5]);
						}
					}
				}
			}
		}

//End of module "hole"
}

  ////////////////////////
 // Number One ENGAGE: //
////////////////////////

// Rotate so it sits correctly on plate (whoops) and make upside down
rotate([0,180,90]){
// put plate at 0,0,0 for easier printing
translate([-height_sizes[plate_size]/2,-solid_plate_width/2,-6]){

    union() {
    
if (plate_width == 1) {
	difference() {
		plate();
		translate([0,0,-3]) plate_inner();
		plate1();
			}
		union() {
		plate1_solid();
		}
	    }
else if (plate_width == 2) {
difference()
{
plate();
translate([0,0,-3]) plate_inner();
plate1();
plate2();
}
union() {
		plate1_solid();
		plate2_solid();
		}
}
else if (plate_width == 3) {
difference()
{
plate();
translate([0,0,-3]) plate_inner();
plate1();
plate2();
plate3();
}
union() {
		plate1_solid();
		plate2_solid();
		plate3_solid();
		}
}

else if (plate_width == 4) {
difference()
{
plate();
translate([0,0,-3]) plate_inner();
plate1();
plate2();
plate3();
plate4();
}
union() {
		plate1_solid();
		plate2_solid();
		plate3_solid();
		plate4_solid();
		}
}

else if (plate_width == 5) {
difference()
{
plate();
translate([0,0,-3]) plate_inner();
plate1();
plate2();
plate3();
plate4();
plate5();
}
union() {
		plate1_solid();
		plate2_solid();
		plate3_solid();
		plate4_solid();
		plate5_solid();
		}
}
extend_box();	

}

//End Rotate
}
//End Translate
}
